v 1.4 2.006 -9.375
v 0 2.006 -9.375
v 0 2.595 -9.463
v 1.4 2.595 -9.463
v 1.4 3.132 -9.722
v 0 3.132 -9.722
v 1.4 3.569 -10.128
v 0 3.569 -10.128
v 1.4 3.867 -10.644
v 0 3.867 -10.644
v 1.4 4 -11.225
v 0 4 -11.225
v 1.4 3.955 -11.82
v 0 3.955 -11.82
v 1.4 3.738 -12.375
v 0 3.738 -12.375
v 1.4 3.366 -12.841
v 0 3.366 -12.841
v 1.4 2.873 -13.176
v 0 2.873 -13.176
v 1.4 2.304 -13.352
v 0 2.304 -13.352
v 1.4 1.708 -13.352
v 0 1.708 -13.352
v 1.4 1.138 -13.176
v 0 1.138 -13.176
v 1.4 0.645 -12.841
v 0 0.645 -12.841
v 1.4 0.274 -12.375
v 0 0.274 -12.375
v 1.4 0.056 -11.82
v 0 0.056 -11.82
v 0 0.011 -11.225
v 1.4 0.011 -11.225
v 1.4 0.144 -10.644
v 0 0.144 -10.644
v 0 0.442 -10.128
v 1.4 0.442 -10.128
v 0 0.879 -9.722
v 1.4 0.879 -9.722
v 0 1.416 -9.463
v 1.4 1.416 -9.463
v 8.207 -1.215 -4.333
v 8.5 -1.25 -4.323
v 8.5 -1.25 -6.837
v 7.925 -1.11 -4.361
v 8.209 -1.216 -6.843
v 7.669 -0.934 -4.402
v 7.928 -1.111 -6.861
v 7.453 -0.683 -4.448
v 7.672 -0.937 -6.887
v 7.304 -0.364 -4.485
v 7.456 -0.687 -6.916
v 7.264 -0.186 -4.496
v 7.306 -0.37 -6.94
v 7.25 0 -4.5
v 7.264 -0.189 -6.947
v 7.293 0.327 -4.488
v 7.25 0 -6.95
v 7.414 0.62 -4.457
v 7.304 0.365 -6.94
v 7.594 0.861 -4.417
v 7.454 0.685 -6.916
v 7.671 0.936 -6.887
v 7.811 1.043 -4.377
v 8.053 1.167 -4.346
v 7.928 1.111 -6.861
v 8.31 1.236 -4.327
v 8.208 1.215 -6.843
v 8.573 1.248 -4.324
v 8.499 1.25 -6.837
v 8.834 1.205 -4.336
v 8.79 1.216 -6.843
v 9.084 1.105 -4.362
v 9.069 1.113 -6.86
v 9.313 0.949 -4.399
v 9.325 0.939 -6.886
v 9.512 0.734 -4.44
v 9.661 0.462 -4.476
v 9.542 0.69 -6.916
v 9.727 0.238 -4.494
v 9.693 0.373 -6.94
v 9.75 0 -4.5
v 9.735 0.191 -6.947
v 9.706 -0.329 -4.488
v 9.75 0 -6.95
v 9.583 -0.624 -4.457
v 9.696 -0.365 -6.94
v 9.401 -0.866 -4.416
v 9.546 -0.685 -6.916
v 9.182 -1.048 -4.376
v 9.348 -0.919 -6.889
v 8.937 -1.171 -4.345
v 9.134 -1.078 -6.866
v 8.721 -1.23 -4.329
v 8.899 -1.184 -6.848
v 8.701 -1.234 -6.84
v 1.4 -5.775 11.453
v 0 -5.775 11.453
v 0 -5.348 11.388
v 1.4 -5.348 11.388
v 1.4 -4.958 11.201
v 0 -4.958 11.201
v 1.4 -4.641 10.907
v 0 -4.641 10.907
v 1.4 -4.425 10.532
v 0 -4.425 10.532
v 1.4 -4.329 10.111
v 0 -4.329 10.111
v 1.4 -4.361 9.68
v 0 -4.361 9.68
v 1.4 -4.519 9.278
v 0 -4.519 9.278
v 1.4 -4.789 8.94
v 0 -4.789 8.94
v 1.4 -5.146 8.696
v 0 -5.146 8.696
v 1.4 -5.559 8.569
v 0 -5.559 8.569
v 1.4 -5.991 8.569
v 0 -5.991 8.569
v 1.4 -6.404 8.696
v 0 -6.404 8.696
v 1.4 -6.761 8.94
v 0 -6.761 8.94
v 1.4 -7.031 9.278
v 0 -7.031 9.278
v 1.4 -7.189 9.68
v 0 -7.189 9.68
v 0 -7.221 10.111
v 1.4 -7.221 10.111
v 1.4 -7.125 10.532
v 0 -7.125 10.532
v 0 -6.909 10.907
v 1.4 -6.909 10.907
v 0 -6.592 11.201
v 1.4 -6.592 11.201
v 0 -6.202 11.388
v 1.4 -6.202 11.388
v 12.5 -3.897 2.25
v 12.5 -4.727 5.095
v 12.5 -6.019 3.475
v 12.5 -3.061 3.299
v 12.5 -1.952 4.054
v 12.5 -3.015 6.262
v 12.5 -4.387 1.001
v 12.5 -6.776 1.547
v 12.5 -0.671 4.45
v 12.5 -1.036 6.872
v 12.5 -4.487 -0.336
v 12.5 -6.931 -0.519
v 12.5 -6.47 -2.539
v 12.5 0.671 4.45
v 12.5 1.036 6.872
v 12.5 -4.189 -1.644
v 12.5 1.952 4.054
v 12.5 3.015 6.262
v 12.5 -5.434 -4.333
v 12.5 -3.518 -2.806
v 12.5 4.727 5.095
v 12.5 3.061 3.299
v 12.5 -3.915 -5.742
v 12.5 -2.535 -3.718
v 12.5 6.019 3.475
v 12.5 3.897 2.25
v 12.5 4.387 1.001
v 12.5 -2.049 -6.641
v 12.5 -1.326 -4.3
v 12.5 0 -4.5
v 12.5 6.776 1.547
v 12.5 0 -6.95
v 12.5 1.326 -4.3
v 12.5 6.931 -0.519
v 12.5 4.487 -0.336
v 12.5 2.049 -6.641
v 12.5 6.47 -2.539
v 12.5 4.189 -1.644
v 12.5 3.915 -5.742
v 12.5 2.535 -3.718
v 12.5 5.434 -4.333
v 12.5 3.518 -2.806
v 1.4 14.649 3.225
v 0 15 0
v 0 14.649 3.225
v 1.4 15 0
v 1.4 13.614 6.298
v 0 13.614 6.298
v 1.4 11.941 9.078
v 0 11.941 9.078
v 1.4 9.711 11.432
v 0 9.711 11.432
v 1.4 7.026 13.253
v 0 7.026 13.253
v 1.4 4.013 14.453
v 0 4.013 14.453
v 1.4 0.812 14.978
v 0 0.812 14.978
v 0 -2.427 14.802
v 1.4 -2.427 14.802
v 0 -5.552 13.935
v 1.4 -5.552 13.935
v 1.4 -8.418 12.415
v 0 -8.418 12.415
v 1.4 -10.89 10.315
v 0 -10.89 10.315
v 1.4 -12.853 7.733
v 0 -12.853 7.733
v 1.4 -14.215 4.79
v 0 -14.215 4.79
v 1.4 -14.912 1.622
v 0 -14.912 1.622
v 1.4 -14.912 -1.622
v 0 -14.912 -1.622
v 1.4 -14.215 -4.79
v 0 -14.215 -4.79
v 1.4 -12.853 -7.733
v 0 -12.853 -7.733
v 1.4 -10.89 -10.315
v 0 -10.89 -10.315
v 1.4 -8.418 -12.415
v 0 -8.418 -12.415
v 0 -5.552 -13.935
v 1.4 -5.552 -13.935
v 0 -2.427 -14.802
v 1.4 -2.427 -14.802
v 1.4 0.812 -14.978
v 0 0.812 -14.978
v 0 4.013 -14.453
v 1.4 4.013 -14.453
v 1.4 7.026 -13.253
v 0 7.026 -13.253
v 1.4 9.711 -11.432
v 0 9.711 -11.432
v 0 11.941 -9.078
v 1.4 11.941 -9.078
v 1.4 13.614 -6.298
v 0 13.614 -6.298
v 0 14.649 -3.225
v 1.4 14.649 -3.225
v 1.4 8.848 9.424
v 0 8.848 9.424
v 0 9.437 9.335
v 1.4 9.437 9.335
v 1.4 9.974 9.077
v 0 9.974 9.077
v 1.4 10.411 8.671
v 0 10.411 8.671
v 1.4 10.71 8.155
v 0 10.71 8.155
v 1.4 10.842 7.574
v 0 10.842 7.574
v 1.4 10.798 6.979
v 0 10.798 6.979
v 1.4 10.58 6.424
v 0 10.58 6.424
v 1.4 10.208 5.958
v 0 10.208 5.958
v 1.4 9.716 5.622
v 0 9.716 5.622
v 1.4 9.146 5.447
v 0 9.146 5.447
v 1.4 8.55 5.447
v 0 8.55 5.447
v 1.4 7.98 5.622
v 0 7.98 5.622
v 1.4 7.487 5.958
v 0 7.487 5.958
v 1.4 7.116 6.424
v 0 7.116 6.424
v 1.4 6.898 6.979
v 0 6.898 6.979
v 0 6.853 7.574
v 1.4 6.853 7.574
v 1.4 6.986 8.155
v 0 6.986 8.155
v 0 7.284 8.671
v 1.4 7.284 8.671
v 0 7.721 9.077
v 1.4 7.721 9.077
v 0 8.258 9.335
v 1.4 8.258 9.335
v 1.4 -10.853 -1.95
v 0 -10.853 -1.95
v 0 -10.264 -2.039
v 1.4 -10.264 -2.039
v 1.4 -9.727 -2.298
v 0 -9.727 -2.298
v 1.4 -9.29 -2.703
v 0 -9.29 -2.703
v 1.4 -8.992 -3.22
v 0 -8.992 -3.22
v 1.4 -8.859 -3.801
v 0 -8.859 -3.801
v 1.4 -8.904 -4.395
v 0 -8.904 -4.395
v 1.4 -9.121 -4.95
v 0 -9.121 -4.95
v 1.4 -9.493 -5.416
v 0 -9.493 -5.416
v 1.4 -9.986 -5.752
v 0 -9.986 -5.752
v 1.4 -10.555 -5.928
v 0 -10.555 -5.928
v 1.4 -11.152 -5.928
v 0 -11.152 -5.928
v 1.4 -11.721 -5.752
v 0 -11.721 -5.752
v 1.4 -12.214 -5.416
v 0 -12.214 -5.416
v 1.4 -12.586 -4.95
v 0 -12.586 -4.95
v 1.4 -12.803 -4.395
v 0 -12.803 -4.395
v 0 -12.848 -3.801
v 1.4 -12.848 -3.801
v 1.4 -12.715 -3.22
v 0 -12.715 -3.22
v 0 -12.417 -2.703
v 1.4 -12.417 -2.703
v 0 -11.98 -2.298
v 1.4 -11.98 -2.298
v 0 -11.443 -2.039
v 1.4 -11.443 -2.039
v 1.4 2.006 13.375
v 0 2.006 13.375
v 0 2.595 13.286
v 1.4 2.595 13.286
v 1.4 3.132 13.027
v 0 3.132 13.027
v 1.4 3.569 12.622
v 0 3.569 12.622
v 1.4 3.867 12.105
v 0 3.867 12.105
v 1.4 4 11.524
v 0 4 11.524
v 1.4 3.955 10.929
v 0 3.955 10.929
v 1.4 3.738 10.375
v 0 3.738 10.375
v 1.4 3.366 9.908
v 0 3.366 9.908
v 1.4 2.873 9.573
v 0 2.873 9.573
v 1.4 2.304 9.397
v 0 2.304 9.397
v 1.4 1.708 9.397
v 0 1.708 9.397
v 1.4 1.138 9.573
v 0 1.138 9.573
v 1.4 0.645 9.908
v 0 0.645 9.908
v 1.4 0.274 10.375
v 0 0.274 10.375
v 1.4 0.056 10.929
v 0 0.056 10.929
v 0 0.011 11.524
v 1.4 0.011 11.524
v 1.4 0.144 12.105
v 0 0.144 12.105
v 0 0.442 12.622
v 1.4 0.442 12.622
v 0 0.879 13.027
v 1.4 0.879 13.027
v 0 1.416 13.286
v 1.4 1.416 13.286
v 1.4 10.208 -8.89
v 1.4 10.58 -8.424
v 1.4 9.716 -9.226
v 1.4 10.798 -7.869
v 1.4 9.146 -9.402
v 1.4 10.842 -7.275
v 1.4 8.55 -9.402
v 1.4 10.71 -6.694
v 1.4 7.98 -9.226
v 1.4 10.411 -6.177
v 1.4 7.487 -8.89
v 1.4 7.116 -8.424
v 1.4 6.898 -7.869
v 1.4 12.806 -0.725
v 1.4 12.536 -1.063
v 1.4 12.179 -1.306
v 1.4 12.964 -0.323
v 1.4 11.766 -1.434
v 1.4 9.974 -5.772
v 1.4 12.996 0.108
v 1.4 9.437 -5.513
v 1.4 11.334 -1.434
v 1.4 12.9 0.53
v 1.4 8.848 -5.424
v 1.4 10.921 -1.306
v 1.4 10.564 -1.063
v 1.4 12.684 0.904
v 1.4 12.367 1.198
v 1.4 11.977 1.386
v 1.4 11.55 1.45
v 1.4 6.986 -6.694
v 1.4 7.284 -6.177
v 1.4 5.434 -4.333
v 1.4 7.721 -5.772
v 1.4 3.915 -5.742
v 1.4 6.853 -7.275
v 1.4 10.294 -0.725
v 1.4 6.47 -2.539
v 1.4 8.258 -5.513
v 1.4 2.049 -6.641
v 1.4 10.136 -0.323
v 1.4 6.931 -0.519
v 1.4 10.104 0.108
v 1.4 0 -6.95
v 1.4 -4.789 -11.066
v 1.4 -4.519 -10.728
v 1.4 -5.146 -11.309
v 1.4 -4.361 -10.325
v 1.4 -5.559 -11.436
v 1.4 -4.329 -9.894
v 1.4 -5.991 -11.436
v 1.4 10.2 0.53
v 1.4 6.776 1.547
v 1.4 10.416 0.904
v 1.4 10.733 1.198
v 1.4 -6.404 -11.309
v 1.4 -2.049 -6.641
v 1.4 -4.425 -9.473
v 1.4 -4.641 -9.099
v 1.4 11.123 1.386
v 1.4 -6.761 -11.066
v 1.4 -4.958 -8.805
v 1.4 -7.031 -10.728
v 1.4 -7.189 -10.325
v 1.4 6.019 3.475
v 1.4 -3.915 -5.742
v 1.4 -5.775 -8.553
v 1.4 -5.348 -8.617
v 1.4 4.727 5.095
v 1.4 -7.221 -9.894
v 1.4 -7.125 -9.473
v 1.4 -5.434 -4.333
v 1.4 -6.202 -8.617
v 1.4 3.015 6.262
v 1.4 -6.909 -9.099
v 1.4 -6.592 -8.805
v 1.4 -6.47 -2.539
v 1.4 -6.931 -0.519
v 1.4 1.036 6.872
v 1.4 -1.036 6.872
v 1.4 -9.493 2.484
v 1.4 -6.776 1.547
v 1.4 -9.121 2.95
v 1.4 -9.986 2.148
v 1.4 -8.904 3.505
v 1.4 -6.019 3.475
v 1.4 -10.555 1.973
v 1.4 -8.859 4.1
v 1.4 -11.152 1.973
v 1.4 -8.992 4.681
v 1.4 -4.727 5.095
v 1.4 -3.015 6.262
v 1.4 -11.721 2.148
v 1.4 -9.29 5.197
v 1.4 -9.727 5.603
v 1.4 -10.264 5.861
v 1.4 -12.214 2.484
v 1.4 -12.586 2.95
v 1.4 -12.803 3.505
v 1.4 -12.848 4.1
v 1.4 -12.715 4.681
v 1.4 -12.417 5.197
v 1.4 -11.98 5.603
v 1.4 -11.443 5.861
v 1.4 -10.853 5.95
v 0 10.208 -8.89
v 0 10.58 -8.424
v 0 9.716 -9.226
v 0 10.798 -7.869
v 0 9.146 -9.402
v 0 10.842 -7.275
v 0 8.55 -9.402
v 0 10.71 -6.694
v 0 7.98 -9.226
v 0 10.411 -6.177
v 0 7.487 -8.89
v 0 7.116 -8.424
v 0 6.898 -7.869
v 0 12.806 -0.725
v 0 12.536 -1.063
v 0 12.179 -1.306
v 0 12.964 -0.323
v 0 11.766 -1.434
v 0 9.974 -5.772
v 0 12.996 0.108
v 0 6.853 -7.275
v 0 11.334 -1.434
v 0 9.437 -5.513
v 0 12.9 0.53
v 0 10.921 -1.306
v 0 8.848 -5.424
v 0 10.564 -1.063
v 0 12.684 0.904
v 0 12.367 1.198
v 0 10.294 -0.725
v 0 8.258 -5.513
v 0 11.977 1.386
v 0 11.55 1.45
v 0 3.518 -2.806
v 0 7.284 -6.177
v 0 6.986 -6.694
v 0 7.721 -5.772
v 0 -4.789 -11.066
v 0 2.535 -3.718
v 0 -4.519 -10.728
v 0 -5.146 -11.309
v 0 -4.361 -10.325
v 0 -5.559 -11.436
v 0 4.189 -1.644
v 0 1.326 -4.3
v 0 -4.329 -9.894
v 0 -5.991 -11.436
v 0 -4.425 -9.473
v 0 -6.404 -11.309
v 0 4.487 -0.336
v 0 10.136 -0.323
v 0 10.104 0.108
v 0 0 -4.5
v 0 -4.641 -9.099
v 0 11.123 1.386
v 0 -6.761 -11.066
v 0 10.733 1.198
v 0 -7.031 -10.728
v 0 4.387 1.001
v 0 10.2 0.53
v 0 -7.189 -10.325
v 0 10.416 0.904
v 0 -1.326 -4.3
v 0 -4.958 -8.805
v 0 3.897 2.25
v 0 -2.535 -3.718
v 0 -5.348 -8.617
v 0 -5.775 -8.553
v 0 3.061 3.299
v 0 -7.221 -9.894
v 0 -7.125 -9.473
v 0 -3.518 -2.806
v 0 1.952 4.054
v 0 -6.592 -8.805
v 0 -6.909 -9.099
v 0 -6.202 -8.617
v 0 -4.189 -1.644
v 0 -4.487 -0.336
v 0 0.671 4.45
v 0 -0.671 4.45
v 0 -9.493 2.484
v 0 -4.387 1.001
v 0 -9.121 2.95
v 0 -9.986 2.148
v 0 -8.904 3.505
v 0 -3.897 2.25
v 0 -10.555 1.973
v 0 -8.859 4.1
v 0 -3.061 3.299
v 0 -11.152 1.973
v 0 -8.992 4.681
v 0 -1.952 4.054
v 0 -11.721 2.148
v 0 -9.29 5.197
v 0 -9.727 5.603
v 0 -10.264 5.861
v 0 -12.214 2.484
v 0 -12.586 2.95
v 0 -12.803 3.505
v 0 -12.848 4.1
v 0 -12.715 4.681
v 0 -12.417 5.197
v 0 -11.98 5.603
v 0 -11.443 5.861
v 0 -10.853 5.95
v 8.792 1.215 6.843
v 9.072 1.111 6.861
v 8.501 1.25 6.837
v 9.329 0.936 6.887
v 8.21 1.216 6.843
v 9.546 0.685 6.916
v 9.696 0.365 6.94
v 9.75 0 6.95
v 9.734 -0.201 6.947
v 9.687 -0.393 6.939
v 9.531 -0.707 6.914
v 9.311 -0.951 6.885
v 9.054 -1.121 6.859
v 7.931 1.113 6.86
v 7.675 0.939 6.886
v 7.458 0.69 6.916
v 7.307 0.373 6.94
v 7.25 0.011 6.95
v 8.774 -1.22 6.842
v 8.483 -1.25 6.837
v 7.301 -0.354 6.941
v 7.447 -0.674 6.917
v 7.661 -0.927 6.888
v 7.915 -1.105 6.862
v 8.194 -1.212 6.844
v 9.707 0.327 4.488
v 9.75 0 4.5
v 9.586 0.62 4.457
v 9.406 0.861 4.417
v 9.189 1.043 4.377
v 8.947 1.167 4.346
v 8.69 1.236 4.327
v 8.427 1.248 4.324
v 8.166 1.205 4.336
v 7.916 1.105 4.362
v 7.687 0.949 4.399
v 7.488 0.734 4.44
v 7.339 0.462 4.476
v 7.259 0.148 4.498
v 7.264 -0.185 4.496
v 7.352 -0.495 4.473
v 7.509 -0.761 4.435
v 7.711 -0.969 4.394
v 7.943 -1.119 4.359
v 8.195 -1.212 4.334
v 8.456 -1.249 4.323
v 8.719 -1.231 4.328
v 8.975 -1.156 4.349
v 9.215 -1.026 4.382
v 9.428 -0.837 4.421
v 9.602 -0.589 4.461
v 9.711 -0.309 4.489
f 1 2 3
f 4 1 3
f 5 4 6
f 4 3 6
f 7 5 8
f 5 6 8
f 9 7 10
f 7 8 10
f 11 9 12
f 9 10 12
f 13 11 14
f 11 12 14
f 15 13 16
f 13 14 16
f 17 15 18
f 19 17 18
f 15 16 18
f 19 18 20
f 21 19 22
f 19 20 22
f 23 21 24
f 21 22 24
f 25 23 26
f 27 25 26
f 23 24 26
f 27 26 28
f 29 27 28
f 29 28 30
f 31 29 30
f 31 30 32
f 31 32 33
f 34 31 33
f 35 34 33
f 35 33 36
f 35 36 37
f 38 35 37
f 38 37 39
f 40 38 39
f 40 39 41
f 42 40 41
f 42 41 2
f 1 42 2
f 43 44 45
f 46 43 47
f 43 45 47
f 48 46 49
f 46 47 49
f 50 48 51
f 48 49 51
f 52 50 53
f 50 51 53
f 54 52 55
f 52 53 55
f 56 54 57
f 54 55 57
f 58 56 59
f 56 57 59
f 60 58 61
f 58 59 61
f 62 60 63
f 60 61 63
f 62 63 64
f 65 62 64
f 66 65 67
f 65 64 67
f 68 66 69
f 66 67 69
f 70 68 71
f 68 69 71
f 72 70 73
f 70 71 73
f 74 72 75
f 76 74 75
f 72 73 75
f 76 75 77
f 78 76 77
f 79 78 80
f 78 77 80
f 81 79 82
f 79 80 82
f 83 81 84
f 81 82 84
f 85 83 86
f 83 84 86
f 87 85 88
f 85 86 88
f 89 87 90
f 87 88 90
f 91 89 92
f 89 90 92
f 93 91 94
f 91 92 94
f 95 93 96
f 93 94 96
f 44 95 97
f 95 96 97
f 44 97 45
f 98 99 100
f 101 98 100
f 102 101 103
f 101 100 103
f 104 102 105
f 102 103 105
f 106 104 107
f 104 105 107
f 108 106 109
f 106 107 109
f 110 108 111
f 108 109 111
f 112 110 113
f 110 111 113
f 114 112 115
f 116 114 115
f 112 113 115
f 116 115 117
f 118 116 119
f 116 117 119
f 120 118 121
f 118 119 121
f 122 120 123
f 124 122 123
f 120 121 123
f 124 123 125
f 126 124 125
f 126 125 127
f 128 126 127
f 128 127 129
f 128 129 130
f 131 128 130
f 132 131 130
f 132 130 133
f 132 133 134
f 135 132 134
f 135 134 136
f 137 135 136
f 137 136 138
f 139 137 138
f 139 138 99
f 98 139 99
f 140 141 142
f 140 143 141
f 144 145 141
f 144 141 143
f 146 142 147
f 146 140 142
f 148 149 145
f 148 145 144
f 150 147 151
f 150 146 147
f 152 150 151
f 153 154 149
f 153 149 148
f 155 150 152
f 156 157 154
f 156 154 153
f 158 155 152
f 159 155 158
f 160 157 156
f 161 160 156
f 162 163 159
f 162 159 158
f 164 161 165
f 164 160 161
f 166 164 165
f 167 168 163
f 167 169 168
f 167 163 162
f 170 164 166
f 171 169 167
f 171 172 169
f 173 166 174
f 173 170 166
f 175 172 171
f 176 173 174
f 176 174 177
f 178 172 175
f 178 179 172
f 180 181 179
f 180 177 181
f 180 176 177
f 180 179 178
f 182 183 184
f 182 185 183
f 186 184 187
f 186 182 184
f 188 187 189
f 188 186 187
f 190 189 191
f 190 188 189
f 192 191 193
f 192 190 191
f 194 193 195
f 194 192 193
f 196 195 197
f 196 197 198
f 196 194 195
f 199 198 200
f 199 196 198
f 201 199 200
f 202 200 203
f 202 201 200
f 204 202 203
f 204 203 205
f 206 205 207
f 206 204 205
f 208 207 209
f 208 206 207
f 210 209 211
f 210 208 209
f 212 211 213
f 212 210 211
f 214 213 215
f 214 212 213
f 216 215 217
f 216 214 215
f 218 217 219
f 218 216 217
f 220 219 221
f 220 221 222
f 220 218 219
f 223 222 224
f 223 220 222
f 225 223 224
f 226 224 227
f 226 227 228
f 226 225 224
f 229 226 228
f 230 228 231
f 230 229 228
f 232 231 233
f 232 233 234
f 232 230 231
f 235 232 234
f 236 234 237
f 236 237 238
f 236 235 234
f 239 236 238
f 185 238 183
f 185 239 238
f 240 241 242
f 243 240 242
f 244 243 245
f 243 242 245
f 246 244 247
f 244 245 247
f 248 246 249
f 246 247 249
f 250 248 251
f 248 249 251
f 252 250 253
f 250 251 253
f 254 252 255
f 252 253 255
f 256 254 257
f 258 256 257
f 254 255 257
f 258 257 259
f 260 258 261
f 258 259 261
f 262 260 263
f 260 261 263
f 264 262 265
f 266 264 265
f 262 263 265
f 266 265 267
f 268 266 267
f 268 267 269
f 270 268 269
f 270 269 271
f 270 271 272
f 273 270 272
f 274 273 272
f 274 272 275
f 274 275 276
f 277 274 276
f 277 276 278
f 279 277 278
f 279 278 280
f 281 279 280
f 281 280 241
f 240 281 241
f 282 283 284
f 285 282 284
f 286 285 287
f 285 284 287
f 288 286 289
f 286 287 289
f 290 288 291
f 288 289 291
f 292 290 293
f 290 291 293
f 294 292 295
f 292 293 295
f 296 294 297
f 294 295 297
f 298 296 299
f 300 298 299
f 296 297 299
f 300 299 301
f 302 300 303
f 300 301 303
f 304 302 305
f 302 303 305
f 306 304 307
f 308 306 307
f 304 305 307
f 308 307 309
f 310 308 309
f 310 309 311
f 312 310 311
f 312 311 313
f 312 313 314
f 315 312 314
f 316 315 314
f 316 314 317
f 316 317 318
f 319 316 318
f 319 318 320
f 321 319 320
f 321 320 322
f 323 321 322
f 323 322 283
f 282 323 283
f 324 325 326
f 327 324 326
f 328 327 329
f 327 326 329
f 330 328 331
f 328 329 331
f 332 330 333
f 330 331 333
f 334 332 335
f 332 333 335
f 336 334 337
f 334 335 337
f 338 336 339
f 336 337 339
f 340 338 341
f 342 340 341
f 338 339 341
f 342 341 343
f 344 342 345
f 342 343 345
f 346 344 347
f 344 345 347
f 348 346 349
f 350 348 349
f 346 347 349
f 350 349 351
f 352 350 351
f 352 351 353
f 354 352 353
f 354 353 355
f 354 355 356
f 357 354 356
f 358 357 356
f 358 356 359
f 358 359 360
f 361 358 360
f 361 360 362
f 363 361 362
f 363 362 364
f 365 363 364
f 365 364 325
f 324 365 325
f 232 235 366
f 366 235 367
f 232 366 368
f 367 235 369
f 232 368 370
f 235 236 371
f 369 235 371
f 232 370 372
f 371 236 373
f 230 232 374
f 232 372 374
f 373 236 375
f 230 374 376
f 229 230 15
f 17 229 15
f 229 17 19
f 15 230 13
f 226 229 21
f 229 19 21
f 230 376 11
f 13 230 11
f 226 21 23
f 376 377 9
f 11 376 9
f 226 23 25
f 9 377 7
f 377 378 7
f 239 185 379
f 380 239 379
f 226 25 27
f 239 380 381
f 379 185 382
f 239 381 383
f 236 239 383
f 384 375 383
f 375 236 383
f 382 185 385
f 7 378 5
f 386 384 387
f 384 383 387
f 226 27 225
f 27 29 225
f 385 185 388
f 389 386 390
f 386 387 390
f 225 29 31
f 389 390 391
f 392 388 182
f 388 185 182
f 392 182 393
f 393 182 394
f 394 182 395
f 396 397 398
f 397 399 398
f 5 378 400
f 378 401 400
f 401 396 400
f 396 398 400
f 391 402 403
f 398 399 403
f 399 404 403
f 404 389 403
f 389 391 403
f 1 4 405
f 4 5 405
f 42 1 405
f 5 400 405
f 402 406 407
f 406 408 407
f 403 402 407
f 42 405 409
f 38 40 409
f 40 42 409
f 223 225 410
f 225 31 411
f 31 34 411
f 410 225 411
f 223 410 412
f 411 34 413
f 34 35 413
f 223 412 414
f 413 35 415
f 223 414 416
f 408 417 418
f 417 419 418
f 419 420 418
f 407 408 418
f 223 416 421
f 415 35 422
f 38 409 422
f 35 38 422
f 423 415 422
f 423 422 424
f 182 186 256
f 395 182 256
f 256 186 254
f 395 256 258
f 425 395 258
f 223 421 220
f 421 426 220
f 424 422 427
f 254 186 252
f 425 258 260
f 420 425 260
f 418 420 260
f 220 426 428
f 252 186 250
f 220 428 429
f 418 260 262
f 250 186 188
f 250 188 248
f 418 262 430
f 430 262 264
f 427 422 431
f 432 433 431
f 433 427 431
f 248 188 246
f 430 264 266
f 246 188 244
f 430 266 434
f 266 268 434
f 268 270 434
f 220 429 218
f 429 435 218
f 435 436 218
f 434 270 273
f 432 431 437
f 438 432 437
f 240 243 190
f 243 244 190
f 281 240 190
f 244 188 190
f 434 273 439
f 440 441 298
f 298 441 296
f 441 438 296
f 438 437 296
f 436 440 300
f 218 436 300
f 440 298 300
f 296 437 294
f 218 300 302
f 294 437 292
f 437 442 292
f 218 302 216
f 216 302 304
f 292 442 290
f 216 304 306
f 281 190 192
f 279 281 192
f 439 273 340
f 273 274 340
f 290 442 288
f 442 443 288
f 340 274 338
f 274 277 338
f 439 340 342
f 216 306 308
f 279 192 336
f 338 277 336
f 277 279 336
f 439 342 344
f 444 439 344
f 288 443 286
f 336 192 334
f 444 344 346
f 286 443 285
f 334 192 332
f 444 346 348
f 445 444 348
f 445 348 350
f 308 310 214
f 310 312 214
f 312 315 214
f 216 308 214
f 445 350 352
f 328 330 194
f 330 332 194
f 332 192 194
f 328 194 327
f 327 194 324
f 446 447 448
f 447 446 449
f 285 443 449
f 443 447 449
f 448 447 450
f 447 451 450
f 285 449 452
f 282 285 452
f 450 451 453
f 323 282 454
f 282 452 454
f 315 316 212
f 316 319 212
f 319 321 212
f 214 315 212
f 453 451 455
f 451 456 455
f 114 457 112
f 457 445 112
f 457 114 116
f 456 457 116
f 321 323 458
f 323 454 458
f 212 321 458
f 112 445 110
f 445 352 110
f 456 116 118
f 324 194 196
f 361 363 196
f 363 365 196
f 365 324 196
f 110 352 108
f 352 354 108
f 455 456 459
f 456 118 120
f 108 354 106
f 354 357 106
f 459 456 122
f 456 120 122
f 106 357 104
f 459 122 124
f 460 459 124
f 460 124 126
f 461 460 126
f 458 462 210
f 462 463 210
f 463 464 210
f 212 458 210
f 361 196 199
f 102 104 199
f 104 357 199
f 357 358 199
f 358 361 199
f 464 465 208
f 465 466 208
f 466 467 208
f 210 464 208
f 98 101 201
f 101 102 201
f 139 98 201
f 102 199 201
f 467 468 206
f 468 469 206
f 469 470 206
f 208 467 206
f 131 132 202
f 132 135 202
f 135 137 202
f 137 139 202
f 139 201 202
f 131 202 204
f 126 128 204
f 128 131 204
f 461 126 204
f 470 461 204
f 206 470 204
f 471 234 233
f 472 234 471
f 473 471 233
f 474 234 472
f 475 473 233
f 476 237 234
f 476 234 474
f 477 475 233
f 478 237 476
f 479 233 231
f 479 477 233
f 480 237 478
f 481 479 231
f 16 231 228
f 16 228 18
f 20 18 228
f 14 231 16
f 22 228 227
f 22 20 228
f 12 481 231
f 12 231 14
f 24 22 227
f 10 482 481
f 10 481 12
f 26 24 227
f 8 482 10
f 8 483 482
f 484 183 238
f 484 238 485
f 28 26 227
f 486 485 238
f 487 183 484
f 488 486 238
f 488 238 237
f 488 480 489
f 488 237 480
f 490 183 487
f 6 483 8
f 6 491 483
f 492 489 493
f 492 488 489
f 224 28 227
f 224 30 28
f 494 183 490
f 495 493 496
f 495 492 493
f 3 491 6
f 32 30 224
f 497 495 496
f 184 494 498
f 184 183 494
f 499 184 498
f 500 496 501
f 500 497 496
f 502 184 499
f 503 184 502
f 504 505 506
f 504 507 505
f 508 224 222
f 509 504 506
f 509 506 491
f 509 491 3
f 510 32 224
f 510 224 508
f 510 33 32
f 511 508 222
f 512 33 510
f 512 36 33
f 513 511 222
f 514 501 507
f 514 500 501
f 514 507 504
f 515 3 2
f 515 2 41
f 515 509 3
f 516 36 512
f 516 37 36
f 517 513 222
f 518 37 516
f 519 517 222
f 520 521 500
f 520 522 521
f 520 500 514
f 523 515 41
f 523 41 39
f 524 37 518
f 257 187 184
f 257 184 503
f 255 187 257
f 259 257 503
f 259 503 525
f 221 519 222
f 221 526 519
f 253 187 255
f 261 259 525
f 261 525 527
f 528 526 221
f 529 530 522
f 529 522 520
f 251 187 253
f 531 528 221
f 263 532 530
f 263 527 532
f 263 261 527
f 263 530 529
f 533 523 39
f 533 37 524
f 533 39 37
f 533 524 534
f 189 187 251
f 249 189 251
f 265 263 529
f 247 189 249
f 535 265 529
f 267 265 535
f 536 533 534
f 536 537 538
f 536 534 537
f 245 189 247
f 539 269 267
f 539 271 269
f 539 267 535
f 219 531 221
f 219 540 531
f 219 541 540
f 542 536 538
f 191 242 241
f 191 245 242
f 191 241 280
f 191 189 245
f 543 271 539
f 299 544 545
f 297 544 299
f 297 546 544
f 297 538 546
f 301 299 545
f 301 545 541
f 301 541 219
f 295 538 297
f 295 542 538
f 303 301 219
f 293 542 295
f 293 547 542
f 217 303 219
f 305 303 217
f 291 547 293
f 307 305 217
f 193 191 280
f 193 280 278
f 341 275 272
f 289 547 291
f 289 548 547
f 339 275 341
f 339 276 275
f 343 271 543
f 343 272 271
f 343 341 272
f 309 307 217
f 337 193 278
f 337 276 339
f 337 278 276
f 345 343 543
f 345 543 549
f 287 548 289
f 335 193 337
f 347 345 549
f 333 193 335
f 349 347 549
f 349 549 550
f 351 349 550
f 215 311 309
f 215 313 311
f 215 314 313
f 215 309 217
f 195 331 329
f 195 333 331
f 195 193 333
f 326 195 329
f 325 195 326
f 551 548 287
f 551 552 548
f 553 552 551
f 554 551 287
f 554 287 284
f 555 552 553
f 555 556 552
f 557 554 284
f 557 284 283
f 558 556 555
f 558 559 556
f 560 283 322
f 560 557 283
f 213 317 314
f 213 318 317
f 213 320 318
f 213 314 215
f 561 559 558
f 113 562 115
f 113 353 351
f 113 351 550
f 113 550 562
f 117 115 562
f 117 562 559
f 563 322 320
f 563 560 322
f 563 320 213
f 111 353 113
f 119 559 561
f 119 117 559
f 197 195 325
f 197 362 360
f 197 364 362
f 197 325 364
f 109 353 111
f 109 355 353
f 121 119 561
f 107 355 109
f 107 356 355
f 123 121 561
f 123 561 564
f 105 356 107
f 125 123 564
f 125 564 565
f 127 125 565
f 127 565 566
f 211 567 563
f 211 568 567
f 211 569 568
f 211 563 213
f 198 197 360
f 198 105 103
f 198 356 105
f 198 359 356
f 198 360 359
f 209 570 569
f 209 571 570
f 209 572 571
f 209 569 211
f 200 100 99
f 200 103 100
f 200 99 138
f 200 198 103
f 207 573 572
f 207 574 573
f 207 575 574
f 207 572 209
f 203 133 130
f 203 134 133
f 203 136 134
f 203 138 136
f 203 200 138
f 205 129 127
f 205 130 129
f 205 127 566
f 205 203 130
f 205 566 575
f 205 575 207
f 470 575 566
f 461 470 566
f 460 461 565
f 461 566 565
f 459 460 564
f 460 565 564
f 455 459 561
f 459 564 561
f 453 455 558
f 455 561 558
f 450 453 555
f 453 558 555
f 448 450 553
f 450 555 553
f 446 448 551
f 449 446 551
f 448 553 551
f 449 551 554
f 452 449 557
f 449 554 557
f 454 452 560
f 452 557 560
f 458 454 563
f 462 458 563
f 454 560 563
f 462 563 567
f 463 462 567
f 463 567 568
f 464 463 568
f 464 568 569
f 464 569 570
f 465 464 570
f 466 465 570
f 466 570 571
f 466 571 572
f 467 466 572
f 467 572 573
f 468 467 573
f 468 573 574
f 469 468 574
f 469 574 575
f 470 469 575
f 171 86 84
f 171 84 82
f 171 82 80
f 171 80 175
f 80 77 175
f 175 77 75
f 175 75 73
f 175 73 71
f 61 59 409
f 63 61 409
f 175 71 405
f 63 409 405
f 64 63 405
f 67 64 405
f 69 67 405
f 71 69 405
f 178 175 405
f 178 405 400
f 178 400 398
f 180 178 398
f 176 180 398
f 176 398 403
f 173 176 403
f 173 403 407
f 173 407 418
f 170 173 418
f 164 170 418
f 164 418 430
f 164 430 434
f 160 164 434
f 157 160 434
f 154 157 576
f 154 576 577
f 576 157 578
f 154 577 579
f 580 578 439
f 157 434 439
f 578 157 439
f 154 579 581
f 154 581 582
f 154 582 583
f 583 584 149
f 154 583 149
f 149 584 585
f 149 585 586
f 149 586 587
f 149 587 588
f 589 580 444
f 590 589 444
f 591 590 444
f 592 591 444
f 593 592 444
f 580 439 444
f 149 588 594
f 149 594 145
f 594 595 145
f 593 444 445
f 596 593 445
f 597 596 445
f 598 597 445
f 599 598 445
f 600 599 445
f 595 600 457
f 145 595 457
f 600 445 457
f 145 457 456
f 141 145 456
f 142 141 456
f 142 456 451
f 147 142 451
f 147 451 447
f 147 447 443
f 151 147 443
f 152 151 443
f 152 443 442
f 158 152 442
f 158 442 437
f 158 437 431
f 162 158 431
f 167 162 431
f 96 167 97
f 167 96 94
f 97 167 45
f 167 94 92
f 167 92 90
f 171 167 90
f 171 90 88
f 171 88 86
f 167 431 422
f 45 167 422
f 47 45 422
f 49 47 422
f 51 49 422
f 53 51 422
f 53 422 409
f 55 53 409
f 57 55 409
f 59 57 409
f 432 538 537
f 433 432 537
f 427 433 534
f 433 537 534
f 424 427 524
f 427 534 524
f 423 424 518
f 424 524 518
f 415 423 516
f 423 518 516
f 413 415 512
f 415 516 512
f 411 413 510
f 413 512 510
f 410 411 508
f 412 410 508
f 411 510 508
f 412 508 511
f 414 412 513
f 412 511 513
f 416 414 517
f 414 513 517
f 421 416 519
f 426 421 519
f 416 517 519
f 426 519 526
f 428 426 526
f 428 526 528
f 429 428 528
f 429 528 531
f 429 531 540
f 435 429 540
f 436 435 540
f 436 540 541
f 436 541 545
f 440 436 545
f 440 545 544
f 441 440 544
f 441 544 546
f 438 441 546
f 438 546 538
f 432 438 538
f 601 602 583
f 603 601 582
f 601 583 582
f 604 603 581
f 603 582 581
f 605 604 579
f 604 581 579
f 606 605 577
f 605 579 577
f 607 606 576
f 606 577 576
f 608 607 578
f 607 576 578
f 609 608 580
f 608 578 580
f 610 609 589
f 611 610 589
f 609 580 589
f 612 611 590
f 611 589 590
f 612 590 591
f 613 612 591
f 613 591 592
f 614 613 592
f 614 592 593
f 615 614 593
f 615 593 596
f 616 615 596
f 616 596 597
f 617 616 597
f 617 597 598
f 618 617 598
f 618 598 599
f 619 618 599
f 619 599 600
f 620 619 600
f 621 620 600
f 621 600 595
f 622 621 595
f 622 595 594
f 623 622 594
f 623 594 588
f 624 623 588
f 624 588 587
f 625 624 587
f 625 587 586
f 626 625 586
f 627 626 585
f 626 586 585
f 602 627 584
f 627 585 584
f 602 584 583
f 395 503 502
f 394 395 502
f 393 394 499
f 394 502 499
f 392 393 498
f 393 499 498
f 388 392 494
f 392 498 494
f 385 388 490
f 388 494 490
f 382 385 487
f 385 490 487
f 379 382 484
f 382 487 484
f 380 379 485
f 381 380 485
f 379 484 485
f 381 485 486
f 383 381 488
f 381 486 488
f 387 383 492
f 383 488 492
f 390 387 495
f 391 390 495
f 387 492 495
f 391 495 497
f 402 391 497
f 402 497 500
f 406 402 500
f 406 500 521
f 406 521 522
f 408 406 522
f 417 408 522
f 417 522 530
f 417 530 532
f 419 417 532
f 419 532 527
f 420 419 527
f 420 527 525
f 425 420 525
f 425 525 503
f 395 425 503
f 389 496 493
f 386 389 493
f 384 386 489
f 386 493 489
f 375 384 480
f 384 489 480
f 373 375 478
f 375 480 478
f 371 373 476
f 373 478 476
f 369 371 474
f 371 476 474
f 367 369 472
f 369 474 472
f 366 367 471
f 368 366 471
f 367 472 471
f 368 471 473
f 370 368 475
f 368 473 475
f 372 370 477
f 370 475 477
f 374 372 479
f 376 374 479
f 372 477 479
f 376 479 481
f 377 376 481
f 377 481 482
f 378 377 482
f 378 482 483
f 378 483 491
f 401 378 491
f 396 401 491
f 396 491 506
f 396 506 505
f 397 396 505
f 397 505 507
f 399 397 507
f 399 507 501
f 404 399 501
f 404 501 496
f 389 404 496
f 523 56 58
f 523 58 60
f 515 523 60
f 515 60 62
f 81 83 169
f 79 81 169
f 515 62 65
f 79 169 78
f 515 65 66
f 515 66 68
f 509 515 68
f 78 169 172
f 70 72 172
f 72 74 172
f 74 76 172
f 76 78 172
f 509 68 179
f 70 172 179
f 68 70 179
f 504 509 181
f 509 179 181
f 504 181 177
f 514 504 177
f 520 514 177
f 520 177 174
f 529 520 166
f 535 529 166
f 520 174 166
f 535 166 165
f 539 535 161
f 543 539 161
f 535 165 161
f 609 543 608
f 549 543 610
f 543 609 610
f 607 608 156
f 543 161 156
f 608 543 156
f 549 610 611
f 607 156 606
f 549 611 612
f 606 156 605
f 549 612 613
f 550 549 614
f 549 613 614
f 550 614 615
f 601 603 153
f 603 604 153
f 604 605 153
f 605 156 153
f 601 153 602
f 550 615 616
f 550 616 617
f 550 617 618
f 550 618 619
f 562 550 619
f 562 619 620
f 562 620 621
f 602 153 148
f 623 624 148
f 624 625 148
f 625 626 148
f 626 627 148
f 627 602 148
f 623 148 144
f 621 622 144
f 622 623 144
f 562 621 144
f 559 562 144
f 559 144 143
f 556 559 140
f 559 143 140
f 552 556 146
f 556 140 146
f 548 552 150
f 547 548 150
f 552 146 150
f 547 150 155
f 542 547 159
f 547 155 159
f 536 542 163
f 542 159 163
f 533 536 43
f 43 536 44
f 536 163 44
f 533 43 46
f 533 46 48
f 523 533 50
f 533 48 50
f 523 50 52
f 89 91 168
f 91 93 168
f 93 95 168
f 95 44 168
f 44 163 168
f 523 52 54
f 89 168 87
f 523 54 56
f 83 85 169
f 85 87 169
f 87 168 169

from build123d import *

# Parameters (mm, degrees)
SKETCH1_W                      = 1.4
SKETCH1_H                      = 15
SKETCH2_R                      = 6.95
BOSS_EXTRUDE1_DEPTH            = 11.1
F_4_0_4_DIAMETER_HOLE1_D       = 4
F_4_0_4_DIAMETER_HOLE1_DEPTH   = 1.4
F_2_9_2_9_DIAMETER_HOLE1_D     = 2.9
F_2_9_2_9_DIAMETER_HOLE1_DEPTH = 1.4
F_9_0_9_DIAMETER_HOLE1_D       = 9
F_9_0_9_DIAMETER_HOLE1_DEPTH   = 12.5
SKETCH9_W                      = 1.25
SKETCH9_H                      = 10.677095884
F_2_5_2_5_DIAMETER_HOLE2_D     = 2.5
F_2_5_2_5_DIAMETER_HOLE2_DEPTH = 10.677095884


with BuildPart() as part:
    # Sketch1 → Revolve1 (revolve)
    with BuildSketch(Plane.XY):
        with Locations((0.7, 7.5)):
            Rectangle(SKETCH1_W, SKETCH1_H)
    revolve(axis=Axis((0, 0, 0), (1, 0, 0)))

    # Sketch2 → Boss-Extrude1 (add)
    with BuildSketch(Plane(origin=(1.4, 0, 0), x_dir=(0, 0, -1), z_dir=(1, 0, 0))):
        Circle(SKETCH2_R)
    extrude(amount=BOSS_EXTRUDE1_DEPTH)

    # Ø4.0 (4) Diameter Hole1
    with Locations(Plane(origin=(1.4, 0, 0), x_dir=(0, 0, -1), z_dir=(1, 0, 0))):
        with Locations((-7.424196892, 8.847813318), (-11.374529547, 2.005636452), (-3.950332655, -10.85344977), (3.950332655, -10.85344977), (11.374529547, 2.005636452), (7.424196892, 8.847813318)):
            Hole(F_4_0_4_DIAMETER_HOLE1_D / 2, depth=F_4_0_4_DIAMETER_HOLE1_DEPTH)

    # Ø2.9 (2.9) Diameter Hole1
    with Locations(Plane(origin=(1.4, 0, 0), x_dir=(0, 0, -1), z_dir=(1, 0, 0))):
        with Locations((0, 11.55), (-10.002593414, -5.775), (10.002593414, -5.775)):
            Hole(F_2_9_2_9_DIAMETER_HOLE1_D / 2, depth=F_2_9_2_9_DIAMETER_HOLE1_DEPTH)

    # Ø9.0 (9) Diameter Hole1
    with Locations(Plane.ZY):
        with Locations((0, 0)):
            Hole(F_9_0_9_DIAMETER_HOLE1_D / 2, depth=F_9_0_9_DIAMETER_HOLE1_DEPTH)

    # Sketch9 → Ø2.5 (2.5) Diameter Hole1 (revolve, cut)
    with BuildSketch(Plane(origin=(8.5, 0, -4.322904116), x_dir=(0, -1, 0), z_dir=(1, 0, 0))):
        with Locations((0.625, 5.338547942)):
            Rectangle(SKETCH9_W, SKETCH9_H)
    revolve(axis=Axis((8.5, 0, 2.027095884), (0, 0, -1)), mode=Mode.SUBTRACT)

    # Ø2.5 (2.5) Diameter Hole2
    with Locations(Plane(origin=(0, 0, 4.322904116), x_dir=(-1, 0, 0), z_dir=(0, 0, -1))):
        with Locations((-8.5, 0)):
            Hole(F_2_5_2_5_DIAMETER_HOLE2_D / 2, depth=F_2_5_2_5_DIAMETER_HOLE2_DEPTH)


solid = part.part
